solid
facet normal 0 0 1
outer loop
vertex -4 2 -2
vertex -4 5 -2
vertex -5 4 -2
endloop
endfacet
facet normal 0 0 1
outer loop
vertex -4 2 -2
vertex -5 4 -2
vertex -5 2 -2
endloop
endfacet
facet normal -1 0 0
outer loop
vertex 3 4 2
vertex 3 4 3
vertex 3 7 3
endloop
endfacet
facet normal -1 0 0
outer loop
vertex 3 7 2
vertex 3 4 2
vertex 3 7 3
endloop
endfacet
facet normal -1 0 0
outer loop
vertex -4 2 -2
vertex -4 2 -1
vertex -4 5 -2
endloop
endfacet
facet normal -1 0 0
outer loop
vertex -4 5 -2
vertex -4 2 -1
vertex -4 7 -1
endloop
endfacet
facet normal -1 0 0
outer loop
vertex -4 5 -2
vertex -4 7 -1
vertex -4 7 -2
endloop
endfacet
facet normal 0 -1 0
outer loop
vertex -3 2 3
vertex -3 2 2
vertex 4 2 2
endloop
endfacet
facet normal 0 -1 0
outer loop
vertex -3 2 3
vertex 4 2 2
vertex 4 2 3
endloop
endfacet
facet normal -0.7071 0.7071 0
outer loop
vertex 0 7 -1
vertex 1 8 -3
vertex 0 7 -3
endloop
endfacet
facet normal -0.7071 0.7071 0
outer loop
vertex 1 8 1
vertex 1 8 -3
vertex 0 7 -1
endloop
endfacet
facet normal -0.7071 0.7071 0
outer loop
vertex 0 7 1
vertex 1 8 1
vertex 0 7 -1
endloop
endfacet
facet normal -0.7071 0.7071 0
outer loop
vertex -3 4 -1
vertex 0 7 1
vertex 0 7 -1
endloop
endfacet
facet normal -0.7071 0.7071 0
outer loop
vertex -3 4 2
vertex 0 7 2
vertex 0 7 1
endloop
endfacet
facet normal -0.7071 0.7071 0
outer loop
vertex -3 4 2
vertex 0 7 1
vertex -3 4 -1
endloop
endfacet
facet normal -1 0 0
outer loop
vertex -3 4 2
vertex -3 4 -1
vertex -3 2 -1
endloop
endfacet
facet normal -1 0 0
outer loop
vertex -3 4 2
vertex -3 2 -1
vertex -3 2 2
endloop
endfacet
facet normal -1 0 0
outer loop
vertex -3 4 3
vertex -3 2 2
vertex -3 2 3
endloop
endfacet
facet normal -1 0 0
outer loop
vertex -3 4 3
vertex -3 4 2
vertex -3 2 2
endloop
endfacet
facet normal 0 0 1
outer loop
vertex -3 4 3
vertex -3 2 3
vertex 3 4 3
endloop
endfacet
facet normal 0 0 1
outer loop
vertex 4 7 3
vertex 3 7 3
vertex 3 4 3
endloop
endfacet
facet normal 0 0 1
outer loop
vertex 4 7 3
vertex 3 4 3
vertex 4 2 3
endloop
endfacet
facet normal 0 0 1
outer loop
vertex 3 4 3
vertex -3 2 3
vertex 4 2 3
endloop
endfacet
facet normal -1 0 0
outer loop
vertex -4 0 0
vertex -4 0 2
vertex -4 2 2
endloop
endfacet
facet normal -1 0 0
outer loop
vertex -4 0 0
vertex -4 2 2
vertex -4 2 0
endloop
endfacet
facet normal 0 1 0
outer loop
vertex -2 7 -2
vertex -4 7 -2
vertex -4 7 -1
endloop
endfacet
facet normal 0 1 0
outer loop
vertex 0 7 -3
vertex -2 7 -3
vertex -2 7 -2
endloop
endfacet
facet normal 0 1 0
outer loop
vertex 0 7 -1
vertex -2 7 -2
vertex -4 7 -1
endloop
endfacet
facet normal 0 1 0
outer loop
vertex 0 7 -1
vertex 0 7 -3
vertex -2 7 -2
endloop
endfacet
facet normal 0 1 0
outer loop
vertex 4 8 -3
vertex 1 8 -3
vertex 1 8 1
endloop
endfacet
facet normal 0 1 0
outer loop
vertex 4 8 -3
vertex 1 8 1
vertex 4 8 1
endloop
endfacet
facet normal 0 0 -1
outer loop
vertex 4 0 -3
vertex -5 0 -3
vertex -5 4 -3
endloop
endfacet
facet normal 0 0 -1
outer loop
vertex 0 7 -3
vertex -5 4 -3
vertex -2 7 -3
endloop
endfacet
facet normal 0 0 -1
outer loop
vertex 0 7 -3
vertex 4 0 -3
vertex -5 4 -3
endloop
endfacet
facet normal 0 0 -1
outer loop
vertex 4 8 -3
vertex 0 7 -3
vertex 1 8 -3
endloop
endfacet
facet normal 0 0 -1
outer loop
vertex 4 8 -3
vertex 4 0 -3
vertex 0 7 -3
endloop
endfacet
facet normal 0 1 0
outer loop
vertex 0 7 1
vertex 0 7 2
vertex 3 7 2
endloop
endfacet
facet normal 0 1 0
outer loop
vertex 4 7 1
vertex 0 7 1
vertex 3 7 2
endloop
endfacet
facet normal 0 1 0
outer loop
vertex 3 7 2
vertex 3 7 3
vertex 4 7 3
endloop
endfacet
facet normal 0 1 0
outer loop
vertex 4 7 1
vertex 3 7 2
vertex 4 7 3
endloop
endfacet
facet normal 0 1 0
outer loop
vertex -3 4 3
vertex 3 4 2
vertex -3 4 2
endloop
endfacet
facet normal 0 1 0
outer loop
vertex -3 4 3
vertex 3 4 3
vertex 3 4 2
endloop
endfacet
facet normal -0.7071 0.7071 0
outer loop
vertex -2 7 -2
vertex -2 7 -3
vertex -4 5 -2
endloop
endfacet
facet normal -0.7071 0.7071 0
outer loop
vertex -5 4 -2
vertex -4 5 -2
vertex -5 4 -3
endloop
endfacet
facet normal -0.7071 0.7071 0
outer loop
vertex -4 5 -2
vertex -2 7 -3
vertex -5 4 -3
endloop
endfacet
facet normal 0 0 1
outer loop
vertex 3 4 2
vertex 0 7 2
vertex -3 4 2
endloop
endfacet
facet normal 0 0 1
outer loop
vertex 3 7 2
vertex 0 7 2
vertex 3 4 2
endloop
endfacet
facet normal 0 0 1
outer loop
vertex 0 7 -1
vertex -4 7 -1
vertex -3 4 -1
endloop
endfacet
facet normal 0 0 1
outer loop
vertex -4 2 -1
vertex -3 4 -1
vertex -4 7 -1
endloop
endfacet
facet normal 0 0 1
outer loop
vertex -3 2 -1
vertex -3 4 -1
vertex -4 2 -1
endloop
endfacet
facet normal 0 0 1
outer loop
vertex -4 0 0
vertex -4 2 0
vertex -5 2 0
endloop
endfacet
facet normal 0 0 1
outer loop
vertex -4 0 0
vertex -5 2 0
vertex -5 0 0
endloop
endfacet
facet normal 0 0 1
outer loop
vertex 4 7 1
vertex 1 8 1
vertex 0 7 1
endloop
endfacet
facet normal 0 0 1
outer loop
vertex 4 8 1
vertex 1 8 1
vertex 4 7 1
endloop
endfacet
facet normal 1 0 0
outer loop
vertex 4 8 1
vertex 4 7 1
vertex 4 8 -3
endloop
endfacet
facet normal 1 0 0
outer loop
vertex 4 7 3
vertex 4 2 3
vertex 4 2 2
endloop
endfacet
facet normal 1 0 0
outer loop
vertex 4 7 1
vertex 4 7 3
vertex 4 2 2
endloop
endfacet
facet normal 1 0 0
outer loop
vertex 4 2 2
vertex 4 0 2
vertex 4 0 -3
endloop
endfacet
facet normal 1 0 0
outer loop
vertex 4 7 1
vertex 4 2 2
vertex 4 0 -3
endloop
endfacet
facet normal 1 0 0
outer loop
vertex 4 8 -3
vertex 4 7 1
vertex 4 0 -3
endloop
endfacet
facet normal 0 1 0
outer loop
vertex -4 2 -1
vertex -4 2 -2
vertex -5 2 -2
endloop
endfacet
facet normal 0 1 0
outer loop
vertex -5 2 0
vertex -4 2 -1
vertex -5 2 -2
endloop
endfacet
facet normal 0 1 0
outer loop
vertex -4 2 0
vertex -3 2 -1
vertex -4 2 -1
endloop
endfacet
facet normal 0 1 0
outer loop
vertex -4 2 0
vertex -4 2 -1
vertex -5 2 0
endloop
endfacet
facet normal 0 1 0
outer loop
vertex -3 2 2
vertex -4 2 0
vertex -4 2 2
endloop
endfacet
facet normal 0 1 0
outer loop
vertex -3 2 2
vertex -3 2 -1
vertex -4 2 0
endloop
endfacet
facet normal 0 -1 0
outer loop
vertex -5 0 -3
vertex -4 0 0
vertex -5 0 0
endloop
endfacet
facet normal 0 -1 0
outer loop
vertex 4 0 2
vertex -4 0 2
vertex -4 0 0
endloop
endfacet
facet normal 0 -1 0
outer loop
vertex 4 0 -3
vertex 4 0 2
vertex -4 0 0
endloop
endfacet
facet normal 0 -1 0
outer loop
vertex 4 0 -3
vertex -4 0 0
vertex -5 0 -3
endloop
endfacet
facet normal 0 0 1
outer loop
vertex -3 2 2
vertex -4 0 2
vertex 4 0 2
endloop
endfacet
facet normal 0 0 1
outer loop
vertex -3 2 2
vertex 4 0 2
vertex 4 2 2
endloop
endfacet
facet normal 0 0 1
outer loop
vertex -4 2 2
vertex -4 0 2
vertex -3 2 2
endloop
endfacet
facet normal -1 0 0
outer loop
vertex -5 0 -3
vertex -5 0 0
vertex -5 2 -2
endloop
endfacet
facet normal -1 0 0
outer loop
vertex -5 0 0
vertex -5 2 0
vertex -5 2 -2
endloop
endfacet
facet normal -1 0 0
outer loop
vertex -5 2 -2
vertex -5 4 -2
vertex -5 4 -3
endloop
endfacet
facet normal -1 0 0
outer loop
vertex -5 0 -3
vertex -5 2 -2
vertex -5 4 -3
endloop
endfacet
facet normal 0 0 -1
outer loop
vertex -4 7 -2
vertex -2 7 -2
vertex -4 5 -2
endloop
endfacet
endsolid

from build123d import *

# Parameters (mm, degrees)
SKETCH1_W           = 8
SKETCH1_H           = 6
BOSS_EXTRUDE1_DEPTH = 8
SKETCH2_W           = 1
SKETCH2_H           = 2
CUT_EXTRUDE1_DEPTH  = 9
SKETCH3_W           = 7
SKETCH3_H           = 4
CUT_EXTRUDE2_DEPTH  = 1
SKETCH4_W           = 3
SKETCH4_H           = 1
CUT_EXTRUDE3_DEPTH  = 2
CUT_EXTRUDE4_DEPTH  = 3
SKETCH8_W           = 1
SKETCH8_H           = 1
CUT_EXTRUDE7_DEPTH  = 1
CUT_EXTRUDE8_DEPTH  = 3
CUT_EXTRUDE9_DEPTH  = 1
SKETCH14_W          = 4
SKETCH14_H          = 2
CUT_EXTRUDE12_DEPTH = 1
BOSS_EXTRUDE2_DEPTH = 1
SKETCH16_W          = 1
SKETCH16_H          = 1
CUT_EXTRUDE13_DEPTH = 5
CUT_EXTRUDE14_DEPTH = 1


with BuildPart() as part:
    # Sketch1 → Boss-Extrude1 (new body)
    with BuildSketch(Plane(origin=(0, 0, 0), x_dir=(1, 0, 0), z_dir=(0, 1, 0))):
        Rectangle(SKETCH1_W, SKETCH1_H)
    extrude(amount=BOSS_EXTRUDE1_DEPTH)

    # Sketch2 → Cut-Extrude1 (cut, through all)
    with BuildSketch(Plane.ZY.offset(4)):
        with Locations((2.5, 1)):
            Rectangle(SKETCH2_W, SKETCH2_H)
    extrude(amount=-CUT_EXTRUDE1_DEPTH, mode=Mode.SUBTRACT)

    # Sketch3 → Cut-Extrude2 (cut)
    with BuildSketch(Plane.XY.offset(3)):
        with Locations((-0.5, 6)):
            Rectangle(SKETCH3_W, SKETCH3_H)
    extrude(amount=-CUT_EXTRUDE2_DEPTH, mode=Mode.SUBTRACT)

    # Sketch4 → Cut-Extrude3 (cut)
    with BuildSketch(Plane.XY.offset(3)):
        with Locations((2.5, 7.5)):
            Rectangle(SKETCH4_W, SKETCH4_H)
    extrude(amount=-CUT_EXTRUDE3_DEPTH, mode=Mode.SUBTRACT)

    # Sketch5 → Cut-Extrude4 (cut)
    with BuildSketch(Plane.XY.offset(2)):
        Polygon((1, 8), (-3, 4), (-4, 4), (-4, 8), align=None)
    extrude(amount=-CUT_EXTRUDE4_DEPTH, mode=Mode.SUBTRACT)

    # Sketch8 → Cut-Extrude7 (cut)
    with BuildSketch(Plane(origin=(1, 0, 0), x_dir=(0, 0, -1), z_dir=(1, 0, 0))):
        with Locations((-1.5, 7.5)):
            Rectangle(SKETCH8_W, SKETCH8_H)
    extrude(amount=-CUT_EXTRUDE7_DEPTH, mode=Mode.SUBTRACT)

    # Sketch9 → Cut-Extrude8 (cut, through all)
    with BuildSketch(Plane.XY.offset(-1)):
        Polygon((0, 8), (1, 8), (0, 7), align=None)
    extrude(amount=-CUT_EXTRUDE8_DEPTH, mode=Mode.SUBTRACT)

    # Sketch10 → Cut-Extrude9 (cut)
    with BuildSketch(Plane(origin=(0, 8, 0), x_dir=(1, 0, 0), z_dir=(0, 1, 0))):
        Polygon((-4, 1), (-4, 2), (-2, 2), (-2, 3), (0, 3), (0, 1), align=None)
    extrude(amount=-CUT_EXTRUDE9_DEPTH, mode=Mode.SUBTRACT)

    # Sketch14 → Cut-Extrude12 (cut)
    with BuildSketch(Plane.ZY.offset(4)):
        with Locations((1, 3)):
            Rectangle(SKETCH14_W, SKETCH14_H)
    extrude(amount=-CUT_EXTRUDE12_DEPTH, mode=Mode.SUBTRACT)

    # Sketch15 → Boss-Extrude2 (add)
    with BuildSketch(Plane.ZY.offset(4)):
        Polygon((-3, 8), (-2, 8), (-2, 7), (-1, 7), (-1, 2), (0, 2), (0, 0), (-3, 0), align=None)
    extrude(amount=BOSS_EXTRUDE2_DEPTH)

    # Sketch16 → Cut-Extrude13 (cut)
    with BuildSketch(Plane(origin=(0, 7, 0), x_dir=(1, 0, 0), z_dir=(0, 1, 0))):
        with Locations((-4.5, 1.5)):
            Rectangle(SKETCH16_W, SKETCH16_H)
    extrude(amount=-CUT_EXTRUDE13_DEPTH, mode=Mode.SUBTRACT)

    # Sketch17 → Cut-Extrude14 (cut)
    with BuildSketch(Plane(origin=(0, 0, -3), x_dir=(-1, 0, 0), z_dir=(0, 0, -1))):
        Polygon((2, 7), (5, 4), (5, 8), (2, 8), align=None)
    extrude(amount=-CUT_EXTRUDE14_DEPTH, mode=Mode.SUBTRACT)


solid = part.part
